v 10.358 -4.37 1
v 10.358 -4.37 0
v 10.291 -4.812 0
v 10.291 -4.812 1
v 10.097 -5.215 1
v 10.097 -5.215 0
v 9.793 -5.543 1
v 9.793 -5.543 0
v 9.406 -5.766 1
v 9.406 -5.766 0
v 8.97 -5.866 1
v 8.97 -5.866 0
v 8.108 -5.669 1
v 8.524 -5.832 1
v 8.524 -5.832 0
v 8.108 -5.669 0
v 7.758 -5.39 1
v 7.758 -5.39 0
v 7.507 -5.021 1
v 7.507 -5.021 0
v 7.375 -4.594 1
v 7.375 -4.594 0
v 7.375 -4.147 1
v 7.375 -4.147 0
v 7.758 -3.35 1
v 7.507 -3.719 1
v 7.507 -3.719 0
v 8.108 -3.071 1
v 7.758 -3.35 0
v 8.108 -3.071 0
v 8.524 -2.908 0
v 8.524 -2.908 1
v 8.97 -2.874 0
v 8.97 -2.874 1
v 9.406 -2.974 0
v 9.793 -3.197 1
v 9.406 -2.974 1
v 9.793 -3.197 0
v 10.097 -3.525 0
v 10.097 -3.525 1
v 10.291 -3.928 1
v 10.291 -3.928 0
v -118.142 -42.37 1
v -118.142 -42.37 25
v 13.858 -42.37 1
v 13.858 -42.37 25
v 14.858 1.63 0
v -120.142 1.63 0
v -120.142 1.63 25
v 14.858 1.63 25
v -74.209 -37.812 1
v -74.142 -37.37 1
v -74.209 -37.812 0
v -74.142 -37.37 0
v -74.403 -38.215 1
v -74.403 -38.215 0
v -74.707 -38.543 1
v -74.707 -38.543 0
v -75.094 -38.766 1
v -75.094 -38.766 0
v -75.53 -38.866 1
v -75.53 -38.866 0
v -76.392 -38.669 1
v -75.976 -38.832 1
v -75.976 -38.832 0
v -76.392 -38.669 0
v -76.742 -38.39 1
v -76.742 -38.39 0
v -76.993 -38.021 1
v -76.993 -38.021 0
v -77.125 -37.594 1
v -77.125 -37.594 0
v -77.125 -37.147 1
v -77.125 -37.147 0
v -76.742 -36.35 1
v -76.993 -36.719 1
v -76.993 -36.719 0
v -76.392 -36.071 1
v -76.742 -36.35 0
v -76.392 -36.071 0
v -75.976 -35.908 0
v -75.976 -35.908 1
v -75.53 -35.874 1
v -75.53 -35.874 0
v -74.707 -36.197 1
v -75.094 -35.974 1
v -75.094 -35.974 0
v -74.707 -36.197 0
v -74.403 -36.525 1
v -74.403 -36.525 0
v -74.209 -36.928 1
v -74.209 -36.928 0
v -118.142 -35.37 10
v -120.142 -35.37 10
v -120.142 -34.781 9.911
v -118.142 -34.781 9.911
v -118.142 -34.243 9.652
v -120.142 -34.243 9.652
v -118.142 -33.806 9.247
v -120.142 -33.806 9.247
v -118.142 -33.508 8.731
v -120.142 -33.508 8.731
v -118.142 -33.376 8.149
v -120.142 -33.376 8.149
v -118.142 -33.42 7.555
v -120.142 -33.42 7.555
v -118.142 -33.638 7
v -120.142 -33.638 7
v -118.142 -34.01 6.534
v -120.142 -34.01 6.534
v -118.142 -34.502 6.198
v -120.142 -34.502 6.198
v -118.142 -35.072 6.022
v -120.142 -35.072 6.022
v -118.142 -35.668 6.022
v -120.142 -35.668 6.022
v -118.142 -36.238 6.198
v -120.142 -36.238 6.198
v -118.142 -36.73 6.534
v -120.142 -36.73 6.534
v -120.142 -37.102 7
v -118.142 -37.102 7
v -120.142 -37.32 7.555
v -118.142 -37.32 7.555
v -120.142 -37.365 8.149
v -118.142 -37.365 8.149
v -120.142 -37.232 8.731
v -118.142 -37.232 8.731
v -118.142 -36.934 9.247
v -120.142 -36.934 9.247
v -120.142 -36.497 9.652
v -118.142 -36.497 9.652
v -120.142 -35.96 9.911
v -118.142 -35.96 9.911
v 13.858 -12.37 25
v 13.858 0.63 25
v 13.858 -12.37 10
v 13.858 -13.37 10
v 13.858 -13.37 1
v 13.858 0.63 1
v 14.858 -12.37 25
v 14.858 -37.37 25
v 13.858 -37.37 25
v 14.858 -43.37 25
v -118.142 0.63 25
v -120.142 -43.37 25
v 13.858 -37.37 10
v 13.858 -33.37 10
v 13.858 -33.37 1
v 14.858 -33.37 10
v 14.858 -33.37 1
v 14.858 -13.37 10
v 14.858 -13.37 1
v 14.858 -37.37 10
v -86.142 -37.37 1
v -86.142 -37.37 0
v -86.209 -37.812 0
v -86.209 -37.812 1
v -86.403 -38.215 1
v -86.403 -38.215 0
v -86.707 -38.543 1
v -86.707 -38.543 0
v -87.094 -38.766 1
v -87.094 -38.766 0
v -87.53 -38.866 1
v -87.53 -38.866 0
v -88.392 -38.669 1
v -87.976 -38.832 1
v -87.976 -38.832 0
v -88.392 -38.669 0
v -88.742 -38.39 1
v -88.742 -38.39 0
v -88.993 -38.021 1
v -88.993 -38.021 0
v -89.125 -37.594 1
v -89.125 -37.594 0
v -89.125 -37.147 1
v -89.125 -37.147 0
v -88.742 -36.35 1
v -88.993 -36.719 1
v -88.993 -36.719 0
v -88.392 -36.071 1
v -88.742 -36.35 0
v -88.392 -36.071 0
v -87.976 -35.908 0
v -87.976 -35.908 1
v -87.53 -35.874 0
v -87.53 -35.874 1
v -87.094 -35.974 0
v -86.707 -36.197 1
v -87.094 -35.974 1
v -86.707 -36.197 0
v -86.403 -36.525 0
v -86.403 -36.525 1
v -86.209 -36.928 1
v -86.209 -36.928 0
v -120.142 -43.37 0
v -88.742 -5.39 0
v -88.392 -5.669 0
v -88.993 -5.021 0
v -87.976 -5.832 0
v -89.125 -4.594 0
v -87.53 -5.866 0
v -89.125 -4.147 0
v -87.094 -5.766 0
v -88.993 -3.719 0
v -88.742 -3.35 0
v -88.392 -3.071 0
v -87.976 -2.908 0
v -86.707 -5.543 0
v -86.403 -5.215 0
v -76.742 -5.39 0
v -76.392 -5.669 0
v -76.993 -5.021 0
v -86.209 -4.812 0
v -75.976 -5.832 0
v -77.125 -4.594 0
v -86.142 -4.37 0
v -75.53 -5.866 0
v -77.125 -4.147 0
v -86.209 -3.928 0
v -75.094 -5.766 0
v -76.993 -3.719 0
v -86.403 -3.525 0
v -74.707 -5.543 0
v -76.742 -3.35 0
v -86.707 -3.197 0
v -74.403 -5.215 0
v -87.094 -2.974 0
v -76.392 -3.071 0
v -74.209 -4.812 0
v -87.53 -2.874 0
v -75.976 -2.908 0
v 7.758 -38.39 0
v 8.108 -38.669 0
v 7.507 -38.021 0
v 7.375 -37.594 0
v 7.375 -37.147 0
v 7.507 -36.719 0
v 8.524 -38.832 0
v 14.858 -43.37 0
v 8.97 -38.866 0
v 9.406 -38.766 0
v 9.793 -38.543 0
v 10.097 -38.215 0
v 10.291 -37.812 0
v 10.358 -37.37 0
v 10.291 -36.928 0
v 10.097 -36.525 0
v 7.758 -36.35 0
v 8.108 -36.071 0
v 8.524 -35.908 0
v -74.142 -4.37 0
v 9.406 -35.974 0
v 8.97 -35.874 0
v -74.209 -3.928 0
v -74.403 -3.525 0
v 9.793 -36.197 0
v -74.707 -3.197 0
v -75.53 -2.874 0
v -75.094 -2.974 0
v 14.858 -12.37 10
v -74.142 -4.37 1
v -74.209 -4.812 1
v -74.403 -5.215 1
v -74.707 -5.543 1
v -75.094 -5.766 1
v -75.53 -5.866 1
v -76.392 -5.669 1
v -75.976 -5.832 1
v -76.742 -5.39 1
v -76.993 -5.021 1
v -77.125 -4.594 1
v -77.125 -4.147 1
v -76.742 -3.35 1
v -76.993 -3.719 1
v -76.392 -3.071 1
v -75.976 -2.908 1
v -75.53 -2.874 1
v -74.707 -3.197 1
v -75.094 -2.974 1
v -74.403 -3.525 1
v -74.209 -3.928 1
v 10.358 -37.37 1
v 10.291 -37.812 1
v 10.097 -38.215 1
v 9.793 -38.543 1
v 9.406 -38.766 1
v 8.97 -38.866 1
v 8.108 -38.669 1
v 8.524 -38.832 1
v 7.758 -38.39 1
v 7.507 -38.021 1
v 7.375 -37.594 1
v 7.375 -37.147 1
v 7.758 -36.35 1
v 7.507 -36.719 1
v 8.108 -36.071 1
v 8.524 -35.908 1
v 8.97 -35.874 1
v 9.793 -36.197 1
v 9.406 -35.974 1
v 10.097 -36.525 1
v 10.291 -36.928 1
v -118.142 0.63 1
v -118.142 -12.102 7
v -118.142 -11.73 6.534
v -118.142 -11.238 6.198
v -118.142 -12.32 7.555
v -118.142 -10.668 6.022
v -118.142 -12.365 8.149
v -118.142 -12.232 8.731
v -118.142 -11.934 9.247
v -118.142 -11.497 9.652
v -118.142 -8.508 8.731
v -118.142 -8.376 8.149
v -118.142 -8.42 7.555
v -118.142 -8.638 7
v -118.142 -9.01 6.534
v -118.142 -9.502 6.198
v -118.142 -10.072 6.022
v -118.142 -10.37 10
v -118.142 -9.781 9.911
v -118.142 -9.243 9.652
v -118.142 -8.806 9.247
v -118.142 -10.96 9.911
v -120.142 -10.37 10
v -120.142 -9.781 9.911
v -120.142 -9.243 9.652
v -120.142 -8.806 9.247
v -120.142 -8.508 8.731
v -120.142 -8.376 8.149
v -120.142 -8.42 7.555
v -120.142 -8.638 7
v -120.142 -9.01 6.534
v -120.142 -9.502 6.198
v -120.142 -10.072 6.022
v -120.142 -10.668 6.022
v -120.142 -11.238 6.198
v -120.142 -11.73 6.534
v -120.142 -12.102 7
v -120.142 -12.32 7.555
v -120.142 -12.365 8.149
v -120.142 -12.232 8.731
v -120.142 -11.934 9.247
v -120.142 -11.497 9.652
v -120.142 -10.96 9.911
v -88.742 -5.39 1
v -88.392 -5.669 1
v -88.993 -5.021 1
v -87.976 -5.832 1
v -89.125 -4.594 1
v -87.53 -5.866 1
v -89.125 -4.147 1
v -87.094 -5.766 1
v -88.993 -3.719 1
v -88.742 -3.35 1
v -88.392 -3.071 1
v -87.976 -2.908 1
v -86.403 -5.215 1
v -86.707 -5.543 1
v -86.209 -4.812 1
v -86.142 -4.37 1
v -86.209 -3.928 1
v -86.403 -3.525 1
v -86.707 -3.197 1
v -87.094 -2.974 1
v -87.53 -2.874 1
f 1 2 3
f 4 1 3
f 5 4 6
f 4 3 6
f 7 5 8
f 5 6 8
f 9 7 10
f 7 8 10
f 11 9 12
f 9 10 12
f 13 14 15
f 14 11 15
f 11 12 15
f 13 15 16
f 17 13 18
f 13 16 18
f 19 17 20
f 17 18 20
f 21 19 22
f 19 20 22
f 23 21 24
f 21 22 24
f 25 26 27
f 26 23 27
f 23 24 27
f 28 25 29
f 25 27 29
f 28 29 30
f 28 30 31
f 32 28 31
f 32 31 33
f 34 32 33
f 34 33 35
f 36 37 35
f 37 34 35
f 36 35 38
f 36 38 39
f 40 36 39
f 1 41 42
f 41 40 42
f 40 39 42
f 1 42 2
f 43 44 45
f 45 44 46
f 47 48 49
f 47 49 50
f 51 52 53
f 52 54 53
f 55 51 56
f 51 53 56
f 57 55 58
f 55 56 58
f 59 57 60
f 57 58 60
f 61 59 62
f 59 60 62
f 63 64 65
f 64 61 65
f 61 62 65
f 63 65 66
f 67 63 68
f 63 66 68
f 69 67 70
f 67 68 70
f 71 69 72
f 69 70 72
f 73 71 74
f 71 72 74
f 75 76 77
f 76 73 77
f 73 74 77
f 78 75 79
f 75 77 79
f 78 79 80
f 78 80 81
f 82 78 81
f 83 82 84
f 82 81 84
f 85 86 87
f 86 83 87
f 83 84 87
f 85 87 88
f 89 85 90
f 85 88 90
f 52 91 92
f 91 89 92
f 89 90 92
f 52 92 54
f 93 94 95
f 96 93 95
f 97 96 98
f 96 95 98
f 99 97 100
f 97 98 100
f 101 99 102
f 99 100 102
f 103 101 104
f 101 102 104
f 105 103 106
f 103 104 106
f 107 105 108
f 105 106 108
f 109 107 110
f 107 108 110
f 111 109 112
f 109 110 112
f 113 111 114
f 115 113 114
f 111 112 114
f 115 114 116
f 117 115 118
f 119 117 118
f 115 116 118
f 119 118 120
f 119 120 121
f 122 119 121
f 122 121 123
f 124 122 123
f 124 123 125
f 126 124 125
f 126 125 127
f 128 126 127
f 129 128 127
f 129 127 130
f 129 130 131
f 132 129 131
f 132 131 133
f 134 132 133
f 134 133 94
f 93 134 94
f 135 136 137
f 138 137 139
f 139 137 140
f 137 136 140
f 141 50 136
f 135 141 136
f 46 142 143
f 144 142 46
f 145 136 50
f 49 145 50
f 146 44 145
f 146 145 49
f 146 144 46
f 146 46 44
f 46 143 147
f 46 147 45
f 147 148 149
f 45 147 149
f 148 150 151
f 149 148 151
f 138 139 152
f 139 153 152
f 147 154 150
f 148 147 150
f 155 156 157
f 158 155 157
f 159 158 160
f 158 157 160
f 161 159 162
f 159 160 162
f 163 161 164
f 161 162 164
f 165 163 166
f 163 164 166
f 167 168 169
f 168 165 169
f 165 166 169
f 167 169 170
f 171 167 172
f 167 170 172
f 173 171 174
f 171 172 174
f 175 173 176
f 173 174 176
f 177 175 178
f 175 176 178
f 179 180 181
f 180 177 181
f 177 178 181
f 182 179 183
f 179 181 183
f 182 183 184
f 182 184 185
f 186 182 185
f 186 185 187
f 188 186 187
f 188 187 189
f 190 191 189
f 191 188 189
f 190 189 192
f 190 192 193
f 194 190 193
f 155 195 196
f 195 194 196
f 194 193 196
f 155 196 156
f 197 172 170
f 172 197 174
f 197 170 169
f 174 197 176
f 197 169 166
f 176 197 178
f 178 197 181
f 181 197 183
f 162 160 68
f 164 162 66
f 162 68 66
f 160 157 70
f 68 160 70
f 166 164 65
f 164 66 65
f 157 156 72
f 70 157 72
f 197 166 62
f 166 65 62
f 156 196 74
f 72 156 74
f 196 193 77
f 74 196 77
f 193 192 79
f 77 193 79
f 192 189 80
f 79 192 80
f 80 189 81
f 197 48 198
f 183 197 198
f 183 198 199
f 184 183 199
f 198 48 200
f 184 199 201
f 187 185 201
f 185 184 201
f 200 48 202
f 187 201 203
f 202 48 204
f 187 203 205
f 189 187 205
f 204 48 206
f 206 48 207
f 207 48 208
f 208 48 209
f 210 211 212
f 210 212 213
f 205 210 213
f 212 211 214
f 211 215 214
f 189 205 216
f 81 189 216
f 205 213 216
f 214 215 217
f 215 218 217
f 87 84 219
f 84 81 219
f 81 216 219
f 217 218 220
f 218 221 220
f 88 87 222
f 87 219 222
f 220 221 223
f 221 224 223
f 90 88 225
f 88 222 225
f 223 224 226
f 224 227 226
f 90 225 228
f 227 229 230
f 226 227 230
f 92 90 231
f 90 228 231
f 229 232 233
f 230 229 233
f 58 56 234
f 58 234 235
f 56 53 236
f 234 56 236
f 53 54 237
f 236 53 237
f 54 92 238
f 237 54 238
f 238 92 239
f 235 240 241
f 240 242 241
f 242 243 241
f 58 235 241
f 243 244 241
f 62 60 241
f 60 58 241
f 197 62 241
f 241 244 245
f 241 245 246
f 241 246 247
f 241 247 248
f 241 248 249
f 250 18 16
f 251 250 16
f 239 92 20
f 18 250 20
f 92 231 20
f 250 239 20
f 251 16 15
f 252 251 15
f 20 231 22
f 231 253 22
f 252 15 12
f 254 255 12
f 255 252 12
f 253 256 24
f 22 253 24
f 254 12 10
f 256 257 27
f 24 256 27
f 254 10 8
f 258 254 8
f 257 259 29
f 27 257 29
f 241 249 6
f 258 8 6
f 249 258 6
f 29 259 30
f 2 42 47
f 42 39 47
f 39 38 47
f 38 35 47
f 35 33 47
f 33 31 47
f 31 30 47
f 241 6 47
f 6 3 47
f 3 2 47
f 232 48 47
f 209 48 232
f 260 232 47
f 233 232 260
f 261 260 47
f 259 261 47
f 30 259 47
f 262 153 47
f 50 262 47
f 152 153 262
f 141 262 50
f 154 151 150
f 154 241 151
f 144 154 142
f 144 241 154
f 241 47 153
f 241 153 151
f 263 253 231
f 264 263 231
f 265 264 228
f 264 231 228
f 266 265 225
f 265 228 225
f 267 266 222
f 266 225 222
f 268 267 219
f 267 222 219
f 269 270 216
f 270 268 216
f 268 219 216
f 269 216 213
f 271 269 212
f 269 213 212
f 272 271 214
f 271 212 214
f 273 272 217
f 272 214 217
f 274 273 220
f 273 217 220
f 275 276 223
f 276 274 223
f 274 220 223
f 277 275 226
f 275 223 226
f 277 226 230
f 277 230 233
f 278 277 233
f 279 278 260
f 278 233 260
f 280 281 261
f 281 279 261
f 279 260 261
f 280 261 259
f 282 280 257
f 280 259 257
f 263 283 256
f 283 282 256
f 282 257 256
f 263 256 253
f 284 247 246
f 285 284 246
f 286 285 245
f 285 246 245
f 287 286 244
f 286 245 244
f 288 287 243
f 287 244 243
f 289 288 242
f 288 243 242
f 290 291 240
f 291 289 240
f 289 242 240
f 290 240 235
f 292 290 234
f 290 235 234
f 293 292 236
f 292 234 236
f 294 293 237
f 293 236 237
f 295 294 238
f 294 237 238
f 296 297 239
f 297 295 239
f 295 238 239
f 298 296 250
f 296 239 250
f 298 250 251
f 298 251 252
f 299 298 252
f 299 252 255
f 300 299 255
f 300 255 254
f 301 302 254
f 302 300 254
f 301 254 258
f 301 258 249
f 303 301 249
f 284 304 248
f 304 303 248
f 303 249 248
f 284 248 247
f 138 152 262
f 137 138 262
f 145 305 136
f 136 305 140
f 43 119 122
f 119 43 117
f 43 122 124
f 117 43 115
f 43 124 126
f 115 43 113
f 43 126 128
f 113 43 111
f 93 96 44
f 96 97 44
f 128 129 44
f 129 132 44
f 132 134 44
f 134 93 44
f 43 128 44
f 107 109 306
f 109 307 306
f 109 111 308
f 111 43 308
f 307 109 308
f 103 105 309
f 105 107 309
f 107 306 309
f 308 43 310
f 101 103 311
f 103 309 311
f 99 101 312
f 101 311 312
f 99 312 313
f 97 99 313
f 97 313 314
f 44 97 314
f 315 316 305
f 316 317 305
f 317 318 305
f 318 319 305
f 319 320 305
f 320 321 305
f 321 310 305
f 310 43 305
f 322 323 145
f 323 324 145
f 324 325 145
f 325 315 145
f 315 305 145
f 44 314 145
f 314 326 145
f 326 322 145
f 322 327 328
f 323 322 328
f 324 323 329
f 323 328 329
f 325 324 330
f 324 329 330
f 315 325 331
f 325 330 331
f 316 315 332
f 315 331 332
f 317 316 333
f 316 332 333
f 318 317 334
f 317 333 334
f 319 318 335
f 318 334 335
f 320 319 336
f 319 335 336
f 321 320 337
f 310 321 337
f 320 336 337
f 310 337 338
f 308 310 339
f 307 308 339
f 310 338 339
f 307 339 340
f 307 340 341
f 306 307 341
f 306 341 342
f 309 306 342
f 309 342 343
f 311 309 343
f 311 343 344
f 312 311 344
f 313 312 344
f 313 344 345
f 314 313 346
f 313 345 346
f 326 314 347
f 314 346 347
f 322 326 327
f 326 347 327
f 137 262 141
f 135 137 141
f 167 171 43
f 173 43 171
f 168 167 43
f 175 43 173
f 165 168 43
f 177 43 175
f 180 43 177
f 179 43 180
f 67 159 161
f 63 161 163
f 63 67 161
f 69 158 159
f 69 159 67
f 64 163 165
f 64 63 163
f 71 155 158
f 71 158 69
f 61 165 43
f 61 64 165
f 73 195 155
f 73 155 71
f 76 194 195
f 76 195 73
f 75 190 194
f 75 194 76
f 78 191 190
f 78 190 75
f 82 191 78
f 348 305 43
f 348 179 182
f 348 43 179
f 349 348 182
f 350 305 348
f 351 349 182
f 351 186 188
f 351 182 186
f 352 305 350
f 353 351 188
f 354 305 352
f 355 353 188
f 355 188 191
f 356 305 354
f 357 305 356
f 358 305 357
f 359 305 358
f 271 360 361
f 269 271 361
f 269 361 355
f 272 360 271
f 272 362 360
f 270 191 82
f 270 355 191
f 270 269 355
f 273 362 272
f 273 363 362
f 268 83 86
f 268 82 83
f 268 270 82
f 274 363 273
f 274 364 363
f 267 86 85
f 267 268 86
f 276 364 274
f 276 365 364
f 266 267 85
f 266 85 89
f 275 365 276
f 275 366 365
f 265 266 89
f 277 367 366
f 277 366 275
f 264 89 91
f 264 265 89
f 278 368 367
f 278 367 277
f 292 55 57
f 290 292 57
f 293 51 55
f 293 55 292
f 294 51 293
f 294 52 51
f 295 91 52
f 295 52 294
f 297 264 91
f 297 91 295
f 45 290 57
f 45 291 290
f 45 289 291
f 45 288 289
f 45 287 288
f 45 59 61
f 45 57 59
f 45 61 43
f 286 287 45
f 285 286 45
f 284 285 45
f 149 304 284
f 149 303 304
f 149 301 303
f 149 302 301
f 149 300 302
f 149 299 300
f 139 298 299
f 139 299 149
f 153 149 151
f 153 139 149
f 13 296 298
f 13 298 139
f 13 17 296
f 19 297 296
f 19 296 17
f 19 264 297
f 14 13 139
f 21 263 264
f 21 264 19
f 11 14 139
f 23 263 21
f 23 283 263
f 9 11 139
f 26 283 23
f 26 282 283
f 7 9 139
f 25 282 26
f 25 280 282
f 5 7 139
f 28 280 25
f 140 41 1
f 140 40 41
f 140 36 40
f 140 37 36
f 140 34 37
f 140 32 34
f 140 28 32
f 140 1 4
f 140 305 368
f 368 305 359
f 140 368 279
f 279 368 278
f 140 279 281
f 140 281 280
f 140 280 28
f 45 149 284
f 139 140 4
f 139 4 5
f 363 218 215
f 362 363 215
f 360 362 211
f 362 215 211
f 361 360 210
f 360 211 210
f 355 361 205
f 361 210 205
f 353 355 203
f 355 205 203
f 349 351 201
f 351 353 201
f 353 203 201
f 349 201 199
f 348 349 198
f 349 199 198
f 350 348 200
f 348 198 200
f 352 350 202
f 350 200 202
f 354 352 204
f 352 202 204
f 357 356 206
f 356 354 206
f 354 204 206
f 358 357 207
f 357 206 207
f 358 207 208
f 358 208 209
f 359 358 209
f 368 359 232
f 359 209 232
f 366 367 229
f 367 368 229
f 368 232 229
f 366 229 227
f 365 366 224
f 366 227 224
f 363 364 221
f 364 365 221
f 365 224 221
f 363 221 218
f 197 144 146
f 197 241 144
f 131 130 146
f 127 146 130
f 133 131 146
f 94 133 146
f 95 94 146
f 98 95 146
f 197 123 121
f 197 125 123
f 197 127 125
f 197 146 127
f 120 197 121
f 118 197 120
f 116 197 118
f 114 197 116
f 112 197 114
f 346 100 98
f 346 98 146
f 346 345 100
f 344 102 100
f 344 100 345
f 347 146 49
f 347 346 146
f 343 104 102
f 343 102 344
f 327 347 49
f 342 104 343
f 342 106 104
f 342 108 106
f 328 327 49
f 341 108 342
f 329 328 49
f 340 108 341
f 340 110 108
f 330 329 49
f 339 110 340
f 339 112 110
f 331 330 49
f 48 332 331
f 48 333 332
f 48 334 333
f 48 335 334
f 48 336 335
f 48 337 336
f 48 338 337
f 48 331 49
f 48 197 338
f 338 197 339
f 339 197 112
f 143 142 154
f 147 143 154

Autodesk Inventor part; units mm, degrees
ref_plane "YZ Plane" through (0, 0, 0) normal (1, 0, 0) x (0, 1, 0)
ref_plane "XZ Plane" through (0, 0, 0) normal (0, 1, 0) x (-1, 0, 0)
ref_plane "XY Plane" through (0, 0, 0) normal (0, 0, 1) x (1, 0, 0)
sketch "Sketch1" plane through (0, 0, 0) normal (0, 0, 1) x (1, 0, 0)
  line L0 (-119.142, 1.6299) -> (13.858, 1.6299)
  line L1 (14.858, 0.6299) -> (14.858, -42.3701)
  line L2 (13.858, -43.3701) -> (-119.142, -43.3701)
  line L3 (-120.142, -42.3701) -> (-120.142, 0.6299)
  arc A0 (-119.142, 1.6299) -> (-120.142, 0.6299) centre (-119.142, 0.6299) ccw
  arc A1 (-120.142, -42.3701) -> (-119.142, -43.3701) centre (-119.142, -42.3701) ccw
  arc A2 (13.858, -43.3701) -> (14.858, -42.3701) centre (13.858, -42.3701) ccw
  arc A3 (14.858, 0.6299) -> (13.858, 1.6299) centre (13.858, 0.6299) ccw
  circle A4 centre (8.858, -4.3701) radius 1.5
  circle A5 centre (-87.642, -37.3701) radius 1.5
  circle A6 centre (-75.642, -37.3701) radius 1.5
  circle A7 centre (8.858, -37.3701) radius 1.5
  circle A8 centre (-87.642, -4.3701) radius 1.5
  circle A9 centre (-75.642, -4.3701) radius 1.5
  point P0 (0, 0)
  point P1 (-120.142, 1.6299)
  point P2 (14.858, 1.6299)
  dimension "d0" = 135
  dimension "d2" = 1
  dimension "d3" = 1
  dimension "d7" = 3
  dimension "d8" = 6
  dimension "d9" = 6
  dimension "d10" = 3
  dimension "d11" = 3
  dimension "d14" = 3
  dimension "d15" = 6
  dimension "d16" = 6
  dimension "d17" = 6
  dimension "d18" = 6
  dimension "d19" = 12
  dimension "d20" = 32.5
  dimension "d21" = 3
  dimension "d22" = 3
  dimension "d23" = 6
  dimension "d24" = 6
  dimension "d25" = 32.5
  dimension "d26" = 12
extrude "Extrusion1" add sketch "Sketch1" along normal blind 1
sketch "Sketch2" plane through (14.858, -42.3701, 0) normal (1, 0, 0) x (0, 0, -1)
  line L0 (0, 44) -> (-1, 44) projected
  line L1 (-25, -1) -> (0, -1)
  line L2 (0, -1) -> (0, 44)
  line L3 (0, 44) -> (-25, 44)
  line L4 (-25, 44) -> (-25, -1)
  line L5 (0, 0) -> (0, -1) projected
  line L6 (0, -1) -> (-10, -1)
  line L7 (-10, -1) -> (-10, 44)
  line L8 (-10, 44) -> (0, 44)
  line L9 (0, 44) -> (0, -1)
  line L10 (0, -1) -> (-1, -1)
  line L11 (-1, -1) -> (-1, 44)
  line L12 (-1, 44) -> (0, 44)
  line L13 (0, 44) -> (0, -1)
  line L14 (-1, 0) -> (-1, 43) projected
  line L15 (-10, 9) -> (-1, 9)
  line L16 (-1, 9) -> (-1, 29)
  line L17 (-1, 29) -> (-10, 29)
  line L18 (-10, 29) -> (-10, 9)
  line L19 (-25, 5) -> (-10, 5)
  line L20 (-10, 5) -> (-10, 30)
  line L21 (-10, 30) -> (-25, 30)
  line L22 (-25, 30) -> (-25, 5)
  point P0 (0, 42.3701)
  point P1 (-1, 9)
  dimension "d29" = 25
  dimension "d30" = 10
  dimension "d31" = 10
  dimension "d32" = 20
  dimension "d33" = 6
  dimension "d34" = 25
extrude "Extrusion2" add sketch "Sketch2" against normal blind 1 contours L11 L17 L7 L3 | L7 L21 L4 L3 | L1 L7 L15 L11 | L1 L4 L19 L7
sketch "Sketch3" plane through (-119.142, -43.3701, 0) normal (0, -1, 0) x (1, 0, 0)
  line L0 (0, 0) -> (-1, 0) projected
  line L1 (134, 25) -> (134, 10) projected
  line L2 (-1, 0) -> (134, 0)
  line L3 (134, 0) -> (134, 25)
  line L4 (134, 25) -> (-1, 25)
  line L5 (-1, 25) -> (-1, 0)
  point P0 (119.142, 0)
extrude "Extrusion3" add sketch "Sketch3" against normal blind 1
sketch "Sketch4" plane through (-119.142, 1.6299, 0) normal (0, 1, 0) x (1, 0, 0)
  line L0 (134, -25) -> (134, -10) projected
  line L1 (-1, 0) -> (-1, -1) projected
  line L2 (134, -25) -> (-1, -25)
  line L3 (-1, -25) -> (-1, 0)
  line L4 (-1, 0) -> (134, 0)
  line L5 (134, 0) -> (134, -25)
  point P0 (119.142, 0)
sketch "Sketch5" plane through (-120.142, -43.3701, 0) normal (-1, 0, 0) x (0, 0, 1)
  line L0 (25, 45) -> (1, 45) projected
  line L1 (0, 44) -> (0, 0) projected
  line L2 (25, 45) -> (0, 45)
  line L3 (0, 45) -> (0, 0)
  line L4 (0, 0) -> (25, 0)
  line L5 (25, 0) -> (25, 45)
  circle A0 centre (8, 33) radius 2
  circle A1 centre (8, 8) radius 2
  point P0 (0, 43.3701)
  point P1 (1, 45)
  dimension "d39" = 25
  dimension "d40" = 12
  dimension "d42" = 8
  dimension "d47" = 4
  dimension "d48" = 4
  dimension "d49" = 8
extrude "Extrusion4" add sketch "Sketch5" against normal blind 2
extrude "Extrusion5" add sketch "Sketch4" against normal blind 1
properties part number "arduino mould"
